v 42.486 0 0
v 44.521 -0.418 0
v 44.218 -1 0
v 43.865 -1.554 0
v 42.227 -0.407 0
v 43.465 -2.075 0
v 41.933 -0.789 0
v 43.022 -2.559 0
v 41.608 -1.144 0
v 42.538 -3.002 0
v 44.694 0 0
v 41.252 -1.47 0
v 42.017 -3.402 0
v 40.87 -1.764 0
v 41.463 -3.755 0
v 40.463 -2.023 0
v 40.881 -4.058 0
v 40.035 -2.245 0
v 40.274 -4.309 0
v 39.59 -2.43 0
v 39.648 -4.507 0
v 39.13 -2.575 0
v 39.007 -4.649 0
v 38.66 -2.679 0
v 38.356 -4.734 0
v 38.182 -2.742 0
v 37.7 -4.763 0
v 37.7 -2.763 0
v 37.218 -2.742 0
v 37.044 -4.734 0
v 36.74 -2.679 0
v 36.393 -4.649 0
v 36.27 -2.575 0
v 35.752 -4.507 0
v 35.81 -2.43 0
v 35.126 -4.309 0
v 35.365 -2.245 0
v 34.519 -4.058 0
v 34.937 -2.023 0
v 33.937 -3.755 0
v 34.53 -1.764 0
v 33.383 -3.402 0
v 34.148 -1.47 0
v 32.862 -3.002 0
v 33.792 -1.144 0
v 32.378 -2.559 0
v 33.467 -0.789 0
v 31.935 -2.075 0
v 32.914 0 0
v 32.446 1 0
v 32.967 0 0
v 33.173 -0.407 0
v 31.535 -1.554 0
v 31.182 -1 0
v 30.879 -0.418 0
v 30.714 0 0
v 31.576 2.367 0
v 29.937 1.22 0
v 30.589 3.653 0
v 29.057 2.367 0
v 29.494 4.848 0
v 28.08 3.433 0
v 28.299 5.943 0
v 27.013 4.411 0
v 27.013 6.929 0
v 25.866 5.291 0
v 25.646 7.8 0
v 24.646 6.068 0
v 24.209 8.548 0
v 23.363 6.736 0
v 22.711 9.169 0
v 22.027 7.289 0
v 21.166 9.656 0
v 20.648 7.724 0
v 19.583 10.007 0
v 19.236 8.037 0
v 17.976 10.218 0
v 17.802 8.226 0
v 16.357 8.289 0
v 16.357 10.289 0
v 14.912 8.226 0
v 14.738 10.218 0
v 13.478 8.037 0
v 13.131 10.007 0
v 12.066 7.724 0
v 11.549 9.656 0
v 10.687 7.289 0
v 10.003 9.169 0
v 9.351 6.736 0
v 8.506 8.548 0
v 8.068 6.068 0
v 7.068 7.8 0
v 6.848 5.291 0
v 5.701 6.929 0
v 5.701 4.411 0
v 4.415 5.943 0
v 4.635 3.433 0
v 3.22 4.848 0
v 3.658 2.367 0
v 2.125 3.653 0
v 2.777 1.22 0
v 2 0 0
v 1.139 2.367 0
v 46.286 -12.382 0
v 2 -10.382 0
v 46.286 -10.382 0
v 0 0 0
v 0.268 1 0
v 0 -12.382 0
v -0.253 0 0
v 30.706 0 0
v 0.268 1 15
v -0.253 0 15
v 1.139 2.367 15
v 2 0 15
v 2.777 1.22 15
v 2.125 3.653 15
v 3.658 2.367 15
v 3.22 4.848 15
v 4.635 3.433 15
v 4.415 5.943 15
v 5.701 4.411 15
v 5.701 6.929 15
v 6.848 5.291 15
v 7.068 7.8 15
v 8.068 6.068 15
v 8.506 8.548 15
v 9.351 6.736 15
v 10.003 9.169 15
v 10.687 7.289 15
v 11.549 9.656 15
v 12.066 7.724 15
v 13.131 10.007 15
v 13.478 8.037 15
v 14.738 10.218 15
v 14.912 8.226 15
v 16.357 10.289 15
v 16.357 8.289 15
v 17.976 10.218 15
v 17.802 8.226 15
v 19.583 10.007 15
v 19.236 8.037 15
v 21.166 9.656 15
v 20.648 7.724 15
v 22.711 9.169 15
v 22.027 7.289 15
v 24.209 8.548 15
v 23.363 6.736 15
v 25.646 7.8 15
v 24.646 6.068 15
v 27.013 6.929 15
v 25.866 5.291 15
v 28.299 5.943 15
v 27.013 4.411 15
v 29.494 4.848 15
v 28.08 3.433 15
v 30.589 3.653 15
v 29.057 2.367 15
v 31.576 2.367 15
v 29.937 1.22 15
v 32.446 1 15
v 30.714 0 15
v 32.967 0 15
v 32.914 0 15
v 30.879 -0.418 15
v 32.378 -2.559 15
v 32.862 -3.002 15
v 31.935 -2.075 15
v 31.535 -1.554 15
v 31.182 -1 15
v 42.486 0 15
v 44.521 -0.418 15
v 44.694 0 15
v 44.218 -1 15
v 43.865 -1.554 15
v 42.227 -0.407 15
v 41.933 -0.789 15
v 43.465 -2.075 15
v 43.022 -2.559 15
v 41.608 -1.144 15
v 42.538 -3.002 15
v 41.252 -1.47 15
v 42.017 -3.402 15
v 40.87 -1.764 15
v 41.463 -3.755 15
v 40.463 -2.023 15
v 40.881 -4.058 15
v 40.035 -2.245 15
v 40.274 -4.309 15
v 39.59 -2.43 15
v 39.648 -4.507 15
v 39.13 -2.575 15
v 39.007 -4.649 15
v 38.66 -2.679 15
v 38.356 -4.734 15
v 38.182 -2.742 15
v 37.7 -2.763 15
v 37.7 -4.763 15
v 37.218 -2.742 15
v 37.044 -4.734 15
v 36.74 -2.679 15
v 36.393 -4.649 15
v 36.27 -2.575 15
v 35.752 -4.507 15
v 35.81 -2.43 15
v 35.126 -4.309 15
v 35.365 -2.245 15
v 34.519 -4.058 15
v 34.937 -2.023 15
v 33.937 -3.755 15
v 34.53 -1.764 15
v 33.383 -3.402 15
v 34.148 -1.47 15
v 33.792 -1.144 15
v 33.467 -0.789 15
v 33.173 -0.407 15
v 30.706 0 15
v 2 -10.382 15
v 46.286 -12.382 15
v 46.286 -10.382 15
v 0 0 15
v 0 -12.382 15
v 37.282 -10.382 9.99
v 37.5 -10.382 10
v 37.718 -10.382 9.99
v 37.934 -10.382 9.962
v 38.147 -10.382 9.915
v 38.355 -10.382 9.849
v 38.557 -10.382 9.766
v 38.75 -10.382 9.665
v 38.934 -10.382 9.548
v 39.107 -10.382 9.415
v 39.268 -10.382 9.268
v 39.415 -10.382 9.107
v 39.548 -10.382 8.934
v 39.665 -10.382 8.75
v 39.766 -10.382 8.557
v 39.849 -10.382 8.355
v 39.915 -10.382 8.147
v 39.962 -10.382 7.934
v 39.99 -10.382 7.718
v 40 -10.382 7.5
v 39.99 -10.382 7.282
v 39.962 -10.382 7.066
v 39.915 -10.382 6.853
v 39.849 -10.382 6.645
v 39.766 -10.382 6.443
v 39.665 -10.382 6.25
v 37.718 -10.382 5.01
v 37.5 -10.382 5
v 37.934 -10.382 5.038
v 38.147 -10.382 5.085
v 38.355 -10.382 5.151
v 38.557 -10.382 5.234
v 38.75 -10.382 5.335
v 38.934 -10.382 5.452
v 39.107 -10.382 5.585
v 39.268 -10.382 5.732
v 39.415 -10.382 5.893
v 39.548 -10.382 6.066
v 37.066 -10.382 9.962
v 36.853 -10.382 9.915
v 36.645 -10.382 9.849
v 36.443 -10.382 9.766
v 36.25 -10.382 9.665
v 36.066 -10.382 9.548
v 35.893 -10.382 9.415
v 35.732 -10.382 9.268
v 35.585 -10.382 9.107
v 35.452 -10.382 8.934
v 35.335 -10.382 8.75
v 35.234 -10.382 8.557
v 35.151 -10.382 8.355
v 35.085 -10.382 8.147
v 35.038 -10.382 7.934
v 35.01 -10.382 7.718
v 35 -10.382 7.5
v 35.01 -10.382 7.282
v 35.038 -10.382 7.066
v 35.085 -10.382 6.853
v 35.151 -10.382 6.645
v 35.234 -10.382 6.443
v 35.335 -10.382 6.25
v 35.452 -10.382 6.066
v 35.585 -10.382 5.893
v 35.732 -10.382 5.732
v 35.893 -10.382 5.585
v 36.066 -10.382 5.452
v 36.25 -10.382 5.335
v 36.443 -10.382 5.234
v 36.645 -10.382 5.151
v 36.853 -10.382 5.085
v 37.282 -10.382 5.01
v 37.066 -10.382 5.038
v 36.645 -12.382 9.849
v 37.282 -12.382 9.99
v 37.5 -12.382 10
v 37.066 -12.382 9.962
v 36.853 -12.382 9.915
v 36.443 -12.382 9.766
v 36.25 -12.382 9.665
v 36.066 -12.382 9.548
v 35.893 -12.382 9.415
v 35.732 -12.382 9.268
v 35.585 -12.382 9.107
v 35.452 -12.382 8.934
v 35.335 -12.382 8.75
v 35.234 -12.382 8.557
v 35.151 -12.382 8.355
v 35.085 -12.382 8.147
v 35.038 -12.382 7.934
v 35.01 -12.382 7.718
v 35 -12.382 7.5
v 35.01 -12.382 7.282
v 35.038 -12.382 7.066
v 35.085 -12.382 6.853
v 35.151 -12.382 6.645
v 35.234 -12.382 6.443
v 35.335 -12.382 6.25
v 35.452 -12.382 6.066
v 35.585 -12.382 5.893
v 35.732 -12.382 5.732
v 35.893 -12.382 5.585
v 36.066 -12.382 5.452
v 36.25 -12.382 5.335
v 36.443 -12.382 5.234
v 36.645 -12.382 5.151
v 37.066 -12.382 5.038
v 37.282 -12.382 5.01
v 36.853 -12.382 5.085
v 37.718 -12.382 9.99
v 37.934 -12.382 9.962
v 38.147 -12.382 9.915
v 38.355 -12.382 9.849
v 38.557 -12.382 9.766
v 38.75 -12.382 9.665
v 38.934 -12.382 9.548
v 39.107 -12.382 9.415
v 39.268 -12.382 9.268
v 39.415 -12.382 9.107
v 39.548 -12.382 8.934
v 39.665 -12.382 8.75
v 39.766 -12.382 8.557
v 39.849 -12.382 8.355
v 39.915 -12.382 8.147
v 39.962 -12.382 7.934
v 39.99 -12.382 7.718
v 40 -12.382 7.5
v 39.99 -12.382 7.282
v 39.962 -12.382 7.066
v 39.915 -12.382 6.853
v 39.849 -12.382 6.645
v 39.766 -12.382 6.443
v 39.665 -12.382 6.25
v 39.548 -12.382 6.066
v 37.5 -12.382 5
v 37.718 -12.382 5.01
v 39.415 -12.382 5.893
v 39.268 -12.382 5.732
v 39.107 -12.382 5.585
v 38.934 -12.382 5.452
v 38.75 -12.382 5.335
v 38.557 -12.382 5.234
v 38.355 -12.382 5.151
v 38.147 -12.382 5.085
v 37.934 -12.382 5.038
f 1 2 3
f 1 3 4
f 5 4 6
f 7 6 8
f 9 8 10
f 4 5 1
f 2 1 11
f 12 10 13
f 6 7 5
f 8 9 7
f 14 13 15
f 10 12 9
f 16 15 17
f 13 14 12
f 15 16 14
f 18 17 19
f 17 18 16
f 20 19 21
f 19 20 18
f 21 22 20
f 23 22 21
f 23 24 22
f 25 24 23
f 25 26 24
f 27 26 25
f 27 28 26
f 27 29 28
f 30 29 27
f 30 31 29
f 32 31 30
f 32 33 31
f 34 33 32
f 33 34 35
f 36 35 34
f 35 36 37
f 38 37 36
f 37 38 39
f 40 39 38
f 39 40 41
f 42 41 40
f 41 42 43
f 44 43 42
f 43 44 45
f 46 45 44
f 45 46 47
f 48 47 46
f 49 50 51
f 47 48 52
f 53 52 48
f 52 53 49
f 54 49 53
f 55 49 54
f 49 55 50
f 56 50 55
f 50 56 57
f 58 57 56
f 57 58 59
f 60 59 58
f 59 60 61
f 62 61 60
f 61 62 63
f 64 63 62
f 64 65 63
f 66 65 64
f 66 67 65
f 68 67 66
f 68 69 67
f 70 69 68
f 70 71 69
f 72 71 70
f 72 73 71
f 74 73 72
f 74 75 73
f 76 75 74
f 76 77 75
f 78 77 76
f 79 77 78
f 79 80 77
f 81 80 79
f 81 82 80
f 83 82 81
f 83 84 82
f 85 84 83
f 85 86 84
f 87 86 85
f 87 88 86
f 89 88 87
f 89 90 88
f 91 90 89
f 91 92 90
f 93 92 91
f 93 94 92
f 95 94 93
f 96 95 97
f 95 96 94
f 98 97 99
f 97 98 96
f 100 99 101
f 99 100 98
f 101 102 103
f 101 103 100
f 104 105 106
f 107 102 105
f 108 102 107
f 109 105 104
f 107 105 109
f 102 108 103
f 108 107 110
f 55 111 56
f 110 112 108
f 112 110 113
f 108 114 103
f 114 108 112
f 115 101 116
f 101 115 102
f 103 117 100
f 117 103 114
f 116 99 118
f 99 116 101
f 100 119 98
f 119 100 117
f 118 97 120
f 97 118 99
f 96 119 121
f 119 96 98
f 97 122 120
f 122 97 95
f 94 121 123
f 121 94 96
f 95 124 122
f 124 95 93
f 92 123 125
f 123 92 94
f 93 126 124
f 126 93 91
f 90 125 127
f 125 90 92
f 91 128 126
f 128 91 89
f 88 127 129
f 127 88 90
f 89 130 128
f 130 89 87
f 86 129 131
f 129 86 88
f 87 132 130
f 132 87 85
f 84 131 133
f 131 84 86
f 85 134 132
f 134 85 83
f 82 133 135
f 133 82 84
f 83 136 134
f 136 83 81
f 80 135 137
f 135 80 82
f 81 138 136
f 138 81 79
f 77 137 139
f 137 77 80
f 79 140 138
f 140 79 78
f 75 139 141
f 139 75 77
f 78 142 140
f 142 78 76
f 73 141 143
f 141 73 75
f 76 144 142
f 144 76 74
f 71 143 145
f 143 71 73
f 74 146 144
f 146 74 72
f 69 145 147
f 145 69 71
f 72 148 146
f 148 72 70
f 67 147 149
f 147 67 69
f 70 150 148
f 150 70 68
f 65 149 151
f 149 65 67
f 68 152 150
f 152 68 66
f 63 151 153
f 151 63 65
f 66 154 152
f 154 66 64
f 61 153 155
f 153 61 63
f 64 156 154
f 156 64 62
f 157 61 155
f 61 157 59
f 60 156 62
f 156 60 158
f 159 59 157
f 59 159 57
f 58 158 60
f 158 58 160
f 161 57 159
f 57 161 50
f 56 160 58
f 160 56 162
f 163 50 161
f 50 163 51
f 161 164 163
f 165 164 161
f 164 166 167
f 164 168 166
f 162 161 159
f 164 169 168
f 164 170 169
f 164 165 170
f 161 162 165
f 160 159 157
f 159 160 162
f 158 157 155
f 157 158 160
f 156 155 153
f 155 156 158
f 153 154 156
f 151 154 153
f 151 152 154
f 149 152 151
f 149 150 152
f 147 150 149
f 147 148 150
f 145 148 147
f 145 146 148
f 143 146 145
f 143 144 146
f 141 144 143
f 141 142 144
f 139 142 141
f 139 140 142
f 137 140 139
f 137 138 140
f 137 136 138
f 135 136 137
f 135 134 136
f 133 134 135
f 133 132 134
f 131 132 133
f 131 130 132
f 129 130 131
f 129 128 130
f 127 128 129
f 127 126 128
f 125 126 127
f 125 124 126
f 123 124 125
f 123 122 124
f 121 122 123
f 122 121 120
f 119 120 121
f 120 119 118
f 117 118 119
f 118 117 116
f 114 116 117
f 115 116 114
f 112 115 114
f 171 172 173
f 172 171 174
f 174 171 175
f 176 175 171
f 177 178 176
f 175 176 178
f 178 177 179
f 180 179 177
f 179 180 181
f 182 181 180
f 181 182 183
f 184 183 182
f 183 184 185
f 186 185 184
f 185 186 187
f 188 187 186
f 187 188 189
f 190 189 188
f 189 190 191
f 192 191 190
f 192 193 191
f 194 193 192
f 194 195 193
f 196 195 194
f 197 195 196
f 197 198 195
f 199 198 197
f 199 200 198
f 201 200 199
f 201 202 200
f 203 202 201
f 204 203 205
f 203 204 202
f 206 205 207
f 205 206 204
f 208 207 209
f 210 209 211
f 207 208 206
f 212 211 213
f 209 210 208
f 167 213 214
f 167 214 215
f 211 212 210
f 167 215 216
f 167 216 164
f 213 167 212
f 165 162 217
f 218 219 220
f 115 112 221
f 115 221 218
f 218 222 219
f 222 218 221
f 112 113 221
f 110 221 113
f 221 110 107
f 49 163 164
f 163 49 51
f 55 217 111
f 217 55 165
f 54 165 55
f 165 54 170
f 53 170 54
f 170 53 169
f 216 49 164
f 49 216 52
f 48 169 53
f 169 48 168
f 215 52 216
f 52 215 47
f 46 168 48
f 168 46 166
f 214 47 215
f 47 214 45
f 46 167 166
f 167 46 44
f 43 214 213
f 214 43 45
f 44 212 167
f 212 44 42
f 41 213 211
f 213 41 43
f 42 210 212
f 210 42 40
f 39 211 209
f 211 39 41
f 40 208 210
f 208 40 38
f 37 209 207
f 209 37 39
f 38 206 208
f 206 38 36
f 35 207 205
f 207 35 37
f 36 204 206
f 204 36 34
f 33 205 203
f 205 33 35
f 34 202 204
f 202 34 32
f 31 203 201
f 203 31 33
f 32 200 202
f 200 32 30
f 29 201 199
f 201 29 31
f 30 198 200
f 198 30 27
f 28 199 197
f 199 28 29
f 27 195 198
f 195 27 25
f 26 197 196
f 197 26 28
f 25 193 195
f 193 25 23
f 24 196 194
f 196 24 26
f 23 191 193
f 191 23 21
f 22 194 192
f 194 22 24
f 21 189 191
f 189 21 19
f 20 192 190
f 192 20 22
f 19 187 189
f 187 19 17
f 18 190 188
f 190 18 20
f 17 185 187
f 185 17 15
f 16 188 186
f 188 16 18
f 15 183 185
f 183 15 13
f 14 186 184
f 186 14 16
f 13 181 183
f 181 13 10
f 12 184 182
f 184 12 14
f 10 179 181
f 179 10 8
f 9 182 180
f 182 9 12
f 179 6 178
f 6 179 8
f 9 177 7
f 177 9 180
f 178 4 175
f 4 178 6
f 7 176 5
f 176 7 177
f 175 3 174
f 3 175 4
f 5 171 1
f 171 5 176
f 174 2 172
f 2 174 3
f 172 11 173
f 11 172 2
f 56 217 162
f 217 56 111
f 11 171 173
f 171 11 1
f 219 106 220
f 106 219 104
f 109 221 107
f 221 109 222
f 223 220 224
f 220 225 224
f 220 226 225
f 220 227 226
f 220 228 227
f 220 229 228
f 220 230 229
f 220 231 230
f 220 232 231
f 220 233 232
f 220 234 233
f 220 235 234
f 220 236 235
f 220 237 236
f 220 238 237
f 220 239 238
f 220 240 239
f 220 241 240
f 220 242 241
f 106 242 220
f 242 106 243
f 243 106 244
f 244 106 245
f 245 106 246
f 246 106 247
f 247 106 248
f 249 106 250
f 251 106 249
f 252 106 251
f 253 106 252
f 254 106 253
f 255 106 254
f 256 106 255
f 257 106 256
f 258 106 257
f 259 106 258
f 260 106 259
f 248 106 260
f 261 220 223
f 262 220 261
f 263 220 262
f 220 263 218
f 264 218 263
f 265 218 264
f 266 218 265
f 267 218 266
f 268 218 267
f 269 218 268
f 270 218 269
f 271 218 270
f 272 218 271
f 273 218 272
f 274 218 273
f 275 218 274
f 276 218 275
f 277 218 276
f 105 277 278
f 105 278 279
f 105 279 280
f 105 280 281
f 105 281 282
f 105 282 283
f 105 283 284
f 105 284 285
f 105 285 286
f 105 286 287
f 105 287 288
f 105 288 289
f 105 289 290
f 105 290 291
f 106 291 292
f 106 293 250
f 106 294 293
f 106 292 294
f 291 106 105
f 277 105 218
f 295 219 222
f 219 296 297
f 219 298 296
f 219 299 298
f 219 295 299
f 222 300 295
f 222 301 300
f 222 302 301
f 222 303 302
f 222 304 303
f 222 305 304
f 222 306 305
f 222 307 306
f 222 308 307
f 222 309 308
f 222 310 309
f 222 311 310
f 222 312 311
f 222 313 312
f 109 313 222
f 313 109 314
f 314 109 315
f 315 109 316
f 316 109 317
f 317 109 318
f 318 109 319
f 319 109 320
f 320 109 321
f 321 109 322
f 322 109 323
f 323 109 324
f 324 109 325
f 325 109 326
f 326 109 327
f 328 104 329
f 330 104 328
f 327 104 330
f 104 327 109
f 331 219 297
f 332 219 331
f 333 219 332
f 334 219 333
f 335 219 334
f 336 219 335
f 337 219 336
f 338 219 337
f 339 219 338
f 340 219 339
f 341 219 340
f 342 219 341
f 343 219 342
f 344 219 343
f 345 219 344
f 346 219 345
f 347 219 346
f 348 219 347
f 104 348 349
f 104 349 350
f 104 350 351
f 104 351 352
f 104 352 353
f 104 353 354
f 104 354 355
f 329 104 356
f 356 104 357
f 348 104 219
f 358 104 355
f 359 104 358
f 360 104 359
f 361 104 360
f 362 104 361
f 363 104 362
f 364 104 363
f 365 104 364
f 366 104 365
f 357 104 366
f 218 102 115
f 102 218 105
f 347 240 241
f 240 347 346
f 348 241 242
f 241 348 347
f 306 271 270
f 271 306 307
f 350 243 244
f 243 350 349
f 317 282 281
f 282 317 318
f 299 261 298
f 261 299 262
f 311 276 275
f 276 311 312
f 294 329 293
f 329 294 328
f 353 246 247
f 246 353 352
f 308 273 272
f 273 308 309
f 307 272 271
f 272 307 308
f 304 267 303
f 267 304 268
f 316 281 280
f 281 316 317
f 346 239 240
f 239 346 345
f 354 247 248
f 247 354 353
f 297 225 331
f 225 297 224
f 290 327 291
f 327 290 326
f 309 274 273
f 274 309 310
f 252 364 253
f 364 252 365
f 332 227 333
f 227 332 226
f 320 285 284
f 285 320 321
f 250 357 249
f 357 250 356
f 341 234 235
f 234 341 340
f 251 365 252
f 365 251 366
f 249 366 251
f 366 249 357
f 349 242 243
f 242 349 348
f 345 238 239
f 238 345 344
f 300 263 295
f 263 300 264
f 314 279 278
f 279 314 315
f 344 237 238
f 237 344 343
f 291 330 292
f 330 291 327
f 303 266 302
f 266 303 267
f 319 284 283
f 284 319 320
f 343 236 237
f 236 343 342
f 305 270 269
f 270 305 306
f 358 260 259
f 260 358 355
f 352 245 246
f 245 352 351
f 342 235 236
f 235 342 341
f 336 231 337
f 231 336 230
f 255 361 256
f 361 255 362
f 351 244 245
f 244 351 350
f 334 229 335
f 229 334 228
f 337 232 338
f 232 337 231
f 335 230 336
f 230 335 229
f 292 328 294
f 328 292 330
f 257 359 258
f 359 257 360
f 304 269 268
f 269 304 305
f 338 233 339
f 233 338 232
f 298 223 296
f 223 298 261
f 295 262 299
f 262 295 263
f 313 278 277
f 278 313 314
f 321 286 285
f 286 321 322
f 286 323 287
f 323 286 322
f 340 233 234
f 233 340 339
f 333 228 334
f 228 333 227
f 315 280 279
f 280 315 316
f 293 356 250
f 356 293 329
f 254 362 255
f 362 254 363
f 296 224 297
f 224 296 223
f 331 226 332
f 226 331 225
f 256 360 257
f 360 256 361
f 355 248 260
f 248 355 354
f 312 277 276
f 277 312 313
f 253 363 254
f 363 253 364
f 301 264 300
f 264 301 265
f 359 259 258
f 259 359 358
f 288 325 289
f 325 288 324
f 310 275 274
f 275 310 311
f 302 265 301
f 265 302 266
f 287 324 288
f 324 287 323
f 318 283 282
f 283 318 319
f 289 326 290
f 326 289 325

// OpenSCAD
lens_distance = 35.5;
lens_radius = 2.5;
phone_thinkness = 7;

clip(lens_distance, lens_radius, phone_thinkness);

module semi_circle_shell(radius, shell_thickness = 2, shell_height = 15) {
    difference() {
        rotate_extrude(convexity = 10, $fn=72) 
            translate([radius, 0, 0]) 
                square([shell_thickness, shell_height]);
        
        outer_radius = radius + shell_thickness;
        
        translate([-outer_radius, -outer_radius, -1])
            cube([outer_radius * 2, outer_radius, shell_height + 2]);
    }
}

module curve_shell(radius, shell_thickness = 2,  shell_height = 15) {
    mask_thickness = radius * 0.5;
         
    translate([0, -mask_thickness, 0]) difference() {
        semi_circle_shell(radius, shell_thickness, shell_height);
        
        width = radius + shell_thickness;
        
        translate([-width, 0, -shell_thickness / 2]) 
            cube([width * 2, mask_thickness, shell_height + shell_thickness]);
    }   
}

module wave(l1, l2, shell_thickness = 2, shell_height = 15) {
    square_root_of_3 = 1.732050807568877;
    r1 = 2 * l1 / square_root_of_3;
    r2 = 2 * l2 / square_root_of_3;
    
    translate([l2 + shell_thickness, 0, 0]) 
        curve_shell(r2, shell_thickness, shell_height);
        
    mirror([0, 1, 0]) 
        translate([l1 + 2 * (shell_thickness + l2) + 0.2, 0, 0]) 
            curve_shell(r1, shell_thickness, shell_height);
}

module clip(lens_distance, lens_radius, phone_thickness, shell_thickness = 2, shell_height = 15) {
    l1 = (lens_distance - shell_thickness) / 7;
    l2 = 3 * l1;
    
    square_root_of_3 = 1.732050807568877;
    r1 = 2 * l1 / square_root_of_3;
    
    y_offset = r1 * 0.25 + shell_thickness + phone_thickness;   

    difference() {
        union() {
           wave(l1, l2, shell_thickness, shell_height);

           translate([0, -(phone_thickness + r1 * 0.25 + 2 * shell_thickness), 0]) 
               cube([(l1 + l2) * 2 + shell_thickness * 4, shell_thickness, shell_height]);
           
           translate([0, -y_offset, 0]) cube([shell_thickness, y_offset, shell_height]);
        }
        
        translate([lens_distance + shell_thickness, -y_offset + 2, shell_height / 2]) 
            rotate([90, 0, 0]) 
                cylinder(r=lens_radius, h=6, $fn=72);
    }
}
